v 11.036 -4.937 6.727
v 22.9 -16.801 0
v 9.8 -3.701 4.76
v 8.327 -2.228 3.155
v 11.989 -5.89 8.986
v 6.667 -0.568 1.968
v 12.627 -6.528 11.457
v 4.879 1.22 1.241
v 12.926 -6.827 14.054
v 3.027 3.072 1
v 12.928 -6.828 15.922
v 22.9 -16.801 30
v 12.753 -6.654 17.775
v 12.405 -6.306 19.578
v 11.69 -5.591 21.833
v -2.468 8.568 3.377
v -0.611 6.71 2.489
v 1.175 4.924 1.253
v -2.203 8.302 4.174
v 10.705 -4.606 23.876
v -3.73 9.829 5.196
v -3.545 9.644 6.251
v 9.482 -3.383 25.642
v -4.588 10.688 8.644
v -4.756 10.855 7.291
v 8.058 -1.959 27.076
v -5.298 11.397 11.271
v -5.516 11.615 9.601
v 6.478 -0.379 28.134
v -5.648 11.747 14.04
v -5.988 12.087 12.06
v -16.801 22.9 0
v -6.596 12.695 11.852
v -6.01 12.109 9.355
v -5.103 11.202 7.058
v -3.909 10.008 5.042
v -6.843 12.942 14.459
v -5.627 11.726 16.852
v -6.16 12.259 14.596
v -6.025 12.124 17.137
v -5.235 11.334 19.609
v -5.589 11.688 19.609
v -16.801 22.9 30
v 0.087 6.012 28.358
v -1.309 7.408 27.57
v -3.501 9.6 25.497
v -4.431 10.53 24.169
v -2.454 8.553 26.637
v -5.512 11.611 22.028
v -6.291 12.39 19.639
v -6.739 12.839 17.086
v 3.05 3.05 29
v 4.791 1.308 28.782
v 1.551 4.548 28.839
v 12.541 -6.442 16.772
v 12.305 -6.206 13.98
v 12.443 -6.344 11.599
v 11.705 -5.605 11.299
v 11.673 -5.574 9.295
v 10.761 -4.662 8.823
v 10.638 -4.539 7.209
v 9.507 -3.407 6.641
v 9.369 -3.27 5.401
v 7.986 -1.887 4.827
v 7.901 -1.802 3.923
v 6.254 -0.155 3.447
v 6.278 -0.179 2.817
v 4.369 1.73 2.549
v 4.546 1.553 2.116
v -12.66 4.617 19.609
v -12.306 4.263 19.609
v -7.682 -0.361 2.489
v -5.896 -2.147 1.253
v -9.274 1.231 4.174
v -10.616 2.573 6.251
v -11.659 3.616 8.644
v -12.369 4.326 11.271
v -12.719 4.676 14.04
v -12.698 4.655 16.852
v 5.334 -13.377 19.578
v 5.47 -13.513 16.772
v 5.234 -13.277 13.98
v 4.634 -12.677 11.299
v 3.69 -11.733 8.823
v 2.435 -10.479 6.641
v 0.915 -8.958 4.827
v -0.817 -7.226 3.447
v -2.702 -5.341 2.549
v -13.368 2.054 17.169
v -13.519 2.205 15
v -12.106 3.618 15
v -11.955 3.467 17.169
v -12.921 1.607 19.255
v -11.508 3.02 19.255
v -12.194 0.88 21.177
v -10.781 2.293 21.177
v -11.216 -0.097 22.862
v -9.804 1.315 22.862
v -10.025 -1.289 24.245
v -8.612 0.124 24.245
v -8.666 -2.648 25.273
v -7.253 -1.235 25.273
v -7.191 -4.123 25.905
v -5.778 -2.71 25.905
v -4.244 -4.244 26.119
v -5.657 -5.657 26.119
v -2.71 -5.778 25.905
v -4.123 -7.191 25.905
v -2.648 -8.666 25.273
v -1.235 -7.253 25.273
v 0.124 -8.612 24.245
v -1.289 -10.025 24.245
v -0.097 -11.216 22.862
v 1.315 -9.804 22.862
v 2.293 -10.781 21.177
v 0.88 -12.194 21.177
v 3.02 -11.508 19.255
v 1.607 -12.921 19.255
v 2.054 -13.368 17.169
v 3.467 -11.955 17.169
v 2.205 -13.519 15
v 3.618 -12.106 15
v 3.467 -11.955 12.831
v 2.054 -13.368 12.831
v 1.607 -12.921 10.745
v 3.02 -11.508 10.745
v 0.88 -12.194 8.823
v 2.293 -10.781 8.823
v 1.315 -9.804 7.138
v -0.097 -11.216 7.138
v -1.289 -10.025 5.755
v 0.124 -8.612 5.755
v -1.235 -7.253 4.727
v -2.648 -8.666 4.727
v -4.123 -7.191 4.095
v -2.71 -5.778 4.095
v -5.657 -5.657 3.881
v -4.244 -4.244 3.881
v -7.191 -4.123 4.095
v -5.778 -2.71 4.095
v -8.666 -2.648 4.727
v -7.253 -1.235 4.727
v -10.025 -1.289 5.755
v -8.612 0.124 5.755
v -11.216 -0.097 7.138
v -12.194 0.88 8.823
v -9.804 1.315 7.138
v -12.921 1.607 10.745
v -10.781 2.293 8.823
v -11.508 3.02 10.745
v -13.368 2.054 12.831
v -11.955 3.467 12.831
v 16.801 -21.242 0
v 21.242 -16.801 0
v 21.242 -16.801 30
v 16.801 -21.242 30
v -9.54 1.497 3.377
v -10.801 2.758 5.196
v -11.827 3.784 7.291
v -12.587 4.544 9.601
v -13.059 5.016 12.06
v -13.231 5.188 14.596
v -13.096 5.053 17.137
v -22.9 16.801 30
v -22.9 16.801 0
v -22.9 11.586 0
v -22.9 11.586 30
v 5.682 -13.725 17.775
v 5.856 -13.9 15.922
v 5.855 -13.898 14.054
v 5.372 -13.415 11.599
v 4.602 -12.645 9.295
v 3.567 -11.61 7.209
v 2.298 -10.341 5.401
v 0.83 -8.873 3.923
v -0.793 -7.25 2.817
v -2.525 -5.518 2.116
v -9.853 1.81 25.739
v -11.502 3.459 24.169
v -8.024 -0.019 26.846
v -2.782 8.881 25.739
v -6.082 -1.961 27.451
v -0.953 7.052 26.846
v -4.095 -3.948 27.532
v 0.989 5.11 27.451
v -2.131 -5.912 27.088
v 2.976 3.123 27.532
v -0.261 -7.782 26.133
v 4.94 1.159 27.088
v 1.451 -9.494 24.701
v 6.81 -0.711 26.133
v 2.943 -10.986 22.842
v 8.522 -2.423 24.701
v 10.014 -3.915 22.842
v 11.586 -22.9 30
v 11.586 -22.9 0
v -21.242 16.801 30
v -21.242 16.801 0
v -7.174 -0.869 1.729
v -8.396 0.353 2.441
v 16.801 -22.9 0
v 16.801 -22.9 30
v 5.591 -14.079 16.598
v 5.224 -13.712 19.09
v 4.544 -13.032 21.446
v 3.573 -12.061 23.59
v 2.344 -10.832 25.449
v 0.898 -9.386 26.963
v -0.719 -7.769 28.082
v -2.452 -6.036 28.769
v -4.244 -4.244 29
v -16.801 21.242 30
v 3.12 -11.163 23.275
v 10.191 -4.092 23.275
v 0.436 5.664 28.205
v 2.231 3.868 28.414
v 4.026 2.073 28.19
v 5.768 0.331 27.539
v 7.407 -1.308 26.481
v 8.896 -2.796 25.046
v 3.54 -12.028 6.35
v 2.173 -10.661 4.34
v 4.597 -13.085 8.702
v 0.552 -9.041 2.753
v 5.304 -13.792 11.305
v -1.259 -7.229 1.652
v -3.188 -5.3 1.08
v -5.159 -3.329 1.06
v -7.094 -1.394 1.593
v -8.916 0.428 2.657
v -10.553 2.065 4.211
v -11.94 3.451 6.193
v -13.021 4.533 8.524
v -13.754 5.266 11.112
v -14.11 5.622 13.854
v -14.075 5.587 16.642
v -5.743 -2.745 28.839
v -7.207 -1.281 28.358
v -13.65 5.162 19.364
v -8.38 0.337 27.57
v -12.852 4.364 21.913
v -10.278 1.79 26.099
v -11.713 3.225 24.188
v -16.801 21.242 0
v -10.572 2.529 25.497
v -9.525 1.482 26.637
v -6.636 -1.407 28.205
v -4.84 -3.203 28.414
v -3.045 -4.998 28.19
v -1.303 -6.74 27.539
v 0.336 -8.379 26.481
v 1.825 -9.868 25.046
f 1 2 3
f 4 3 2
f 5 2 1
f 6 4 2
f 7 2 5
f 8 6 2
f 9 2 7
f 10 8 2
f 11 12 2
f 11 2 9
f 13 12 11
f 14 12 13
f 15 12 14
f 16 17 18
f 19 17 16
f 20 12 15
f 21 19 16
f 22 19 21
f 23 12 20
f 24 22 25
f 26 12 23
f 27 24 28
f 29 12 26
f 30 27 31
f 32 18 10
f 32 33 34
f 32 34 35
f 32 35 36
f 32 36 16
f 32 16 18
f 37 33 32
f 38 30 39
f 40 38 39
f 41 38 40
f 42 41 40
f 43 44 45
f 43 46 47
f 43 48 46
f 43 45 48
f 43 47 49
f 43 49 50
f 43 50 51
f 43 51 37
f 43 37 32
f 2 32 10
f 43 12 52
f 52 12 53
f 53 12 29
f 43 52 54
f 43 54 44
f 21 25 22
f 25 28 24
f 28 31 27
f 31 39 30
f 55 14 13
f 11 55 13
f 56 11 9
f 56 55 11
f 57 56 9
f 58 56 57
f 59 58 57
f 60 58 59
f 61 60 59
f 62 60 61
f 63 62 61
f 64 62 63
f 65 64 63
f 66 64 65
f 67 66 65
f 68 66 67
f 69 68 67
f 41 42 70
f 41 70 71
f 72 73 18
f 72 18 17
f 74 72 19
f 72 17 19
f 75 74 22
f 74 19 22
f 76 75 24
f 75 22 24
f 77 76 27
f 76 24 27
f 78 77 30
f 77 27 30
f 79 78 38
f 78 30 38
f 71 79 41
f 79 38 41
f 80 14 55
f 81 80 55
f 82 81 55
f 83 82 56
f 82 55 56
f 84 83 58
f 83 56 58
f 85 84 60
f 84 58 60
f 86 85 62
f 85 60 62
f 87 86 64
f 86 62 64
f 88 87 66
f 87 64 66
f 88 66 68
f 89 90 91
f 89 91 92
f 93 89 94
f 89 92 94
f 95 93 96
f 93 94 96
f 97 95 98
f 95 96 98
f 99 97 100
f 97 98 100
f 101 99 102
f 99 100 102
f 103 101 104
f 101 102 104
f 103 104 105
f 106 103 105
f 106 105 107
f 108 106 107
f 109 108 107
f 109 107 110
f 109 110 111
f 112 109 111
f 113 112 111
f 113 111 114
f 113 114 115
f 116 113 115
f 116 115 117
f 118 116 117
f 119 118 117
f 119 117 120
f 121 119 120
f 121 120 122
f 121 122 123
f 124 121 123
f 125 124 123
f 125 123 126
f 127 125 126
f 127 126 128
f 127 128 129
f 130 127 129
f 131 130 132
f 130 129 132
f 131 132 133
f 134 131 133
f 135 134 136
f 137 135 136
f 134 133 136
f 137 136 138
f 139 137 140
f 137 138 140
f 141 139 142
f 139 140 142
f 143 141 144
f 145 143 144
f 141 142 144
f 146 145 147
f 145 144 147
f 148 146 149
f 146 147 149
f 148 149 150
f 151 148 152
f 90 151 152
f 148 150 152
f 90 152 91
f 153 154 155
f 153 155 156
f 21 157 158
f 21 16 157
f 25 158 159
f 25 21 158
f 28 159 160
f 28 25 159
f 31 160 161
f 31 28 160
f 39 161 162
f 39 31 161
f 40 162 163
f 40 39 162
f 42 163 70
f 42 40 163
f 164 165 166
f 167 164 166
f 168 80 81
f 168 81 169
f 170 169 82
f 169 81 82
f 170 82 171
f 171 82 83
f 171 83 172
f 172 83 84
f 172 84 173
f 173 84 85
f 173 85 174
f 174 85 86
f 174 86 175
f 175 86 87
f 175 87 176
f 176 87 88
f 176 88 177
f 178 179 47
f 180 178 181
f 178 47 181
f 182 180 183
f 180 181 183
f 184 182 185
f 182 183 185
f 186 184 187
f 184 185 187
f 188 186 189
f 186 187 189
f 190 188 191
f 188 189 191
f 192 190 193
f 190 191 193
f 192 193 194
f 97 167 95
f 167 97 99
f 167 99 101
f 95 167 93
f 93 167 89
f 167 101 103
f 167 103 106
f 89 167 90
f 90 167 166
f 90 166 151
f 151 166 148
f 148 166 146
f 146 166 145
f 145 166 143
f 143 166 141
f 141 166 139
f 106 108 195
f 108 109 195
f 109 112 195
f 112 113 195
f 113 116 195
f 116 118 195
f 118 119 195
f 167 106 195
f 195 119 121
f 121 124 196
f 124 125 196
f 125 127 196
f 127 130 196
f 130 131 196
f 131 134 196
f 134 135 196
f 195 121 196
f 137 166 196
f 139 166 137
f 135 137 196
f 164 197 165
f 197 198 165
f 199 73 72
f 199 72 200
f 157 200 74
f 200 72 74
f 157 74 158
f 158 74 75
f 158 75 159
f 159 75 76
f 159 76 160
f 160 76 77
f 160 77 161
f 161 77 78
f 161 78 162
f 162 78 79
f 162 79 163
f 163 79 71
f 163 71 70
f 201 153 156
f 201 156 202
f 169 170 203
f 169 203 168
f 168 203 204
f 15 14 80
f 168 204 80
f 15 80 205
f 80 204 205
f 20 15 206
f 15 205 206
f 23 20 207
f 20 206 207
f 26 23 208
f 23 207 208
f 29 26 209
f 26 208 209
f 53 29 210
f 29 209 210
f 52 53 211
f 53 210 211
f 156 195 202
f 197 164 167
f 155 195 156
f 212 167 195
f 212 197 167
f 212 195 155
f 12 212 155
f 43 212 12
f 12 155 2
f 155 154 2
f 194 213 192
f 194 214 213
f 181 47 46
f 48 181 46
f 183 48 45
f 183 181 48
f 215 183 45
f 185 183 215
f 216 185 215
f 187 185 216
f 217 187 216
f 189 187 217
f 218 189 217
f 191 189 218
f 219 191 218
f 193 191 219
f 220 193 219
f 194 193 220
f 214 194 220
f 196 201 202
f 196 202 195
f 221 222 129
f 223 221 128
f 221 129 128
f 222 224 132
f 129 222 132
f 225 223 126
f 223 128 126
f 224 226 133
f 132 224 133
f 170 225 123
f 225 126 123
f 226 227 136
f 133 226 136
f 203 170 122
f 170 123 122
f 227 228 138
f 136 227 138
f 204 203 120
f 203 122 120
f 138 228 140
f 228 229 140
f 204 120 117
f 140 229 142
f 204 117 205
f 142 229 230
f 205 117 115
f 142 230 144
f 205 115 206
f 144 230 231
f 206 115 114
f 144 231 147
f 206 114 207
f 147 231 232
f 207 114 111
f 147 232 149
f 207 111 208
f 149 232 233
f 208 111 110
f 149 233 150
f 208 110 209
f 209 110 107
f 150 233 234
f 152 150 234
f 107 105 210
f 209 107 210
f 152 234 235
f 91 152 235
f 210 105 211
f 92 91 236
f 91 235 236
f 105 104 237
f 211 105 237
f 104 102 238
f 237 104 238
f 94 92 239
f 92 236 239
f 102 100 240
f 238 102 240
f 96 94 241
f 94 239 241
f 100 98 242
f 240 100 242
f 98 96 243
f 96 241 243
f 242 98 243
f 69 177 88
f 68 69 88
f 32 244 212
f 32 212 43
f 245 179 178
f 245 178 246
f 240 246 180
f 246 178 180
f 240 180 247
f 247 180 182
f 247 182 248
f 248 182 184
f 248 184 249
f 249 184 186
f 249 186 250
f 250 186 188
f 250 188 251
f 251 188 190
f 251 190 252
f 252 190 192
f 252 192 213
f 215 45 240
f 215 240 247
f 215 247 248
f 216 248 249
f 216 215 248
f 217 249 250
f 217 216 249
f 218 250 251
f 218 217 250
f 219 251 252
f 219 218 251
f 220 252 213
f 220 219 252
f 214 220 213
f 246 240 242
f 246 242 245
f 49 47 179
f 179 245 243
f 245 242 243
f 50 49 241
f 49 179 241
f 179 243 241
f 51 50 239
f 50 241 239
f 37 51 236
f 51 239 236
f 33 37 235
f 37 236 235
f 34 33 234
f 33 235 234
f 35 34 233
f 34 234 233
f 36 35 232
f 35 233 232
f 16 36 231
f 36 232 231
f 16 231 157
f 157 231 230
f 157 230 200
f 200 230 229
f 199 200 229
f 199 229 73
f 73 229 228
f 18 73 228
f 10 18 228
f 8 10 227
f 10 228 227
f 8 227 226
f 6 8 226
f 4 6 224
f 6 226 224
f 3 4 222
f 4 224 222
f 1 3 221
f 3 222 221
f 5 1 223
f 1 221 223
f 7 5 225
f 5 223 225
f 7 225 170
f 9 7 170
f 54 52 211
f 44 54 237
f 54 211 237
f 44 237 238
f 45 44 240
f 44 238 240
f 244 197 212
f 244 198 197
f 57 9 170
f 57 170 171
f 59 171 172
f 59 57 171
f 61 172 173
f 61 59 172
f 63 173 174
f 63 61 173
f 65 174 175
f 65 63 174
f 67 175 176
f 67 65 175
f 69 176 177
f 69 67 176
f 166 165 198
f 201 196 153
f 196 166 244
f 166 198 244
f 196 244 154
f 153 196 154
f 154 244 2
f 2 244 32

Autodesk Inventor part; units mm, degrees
ref_plane "YZ Plane" through (0, 0, 0) normal (1, 0, 0) x (0, 1, 0)
ref_plane "XZ Plane" through (0, 0, 0) normal (0, 1, 0) x (-1, 0, 0)
ref_plane "XY Plane" through (0, 0, 0) normal (0, 0, 1) x (1, 0, 0)
sketch "Sketch1" plane through (0, 0, 0) normal (0, 0, 1) x (1, 0, 0)
  line L0 (-16.9, 21.4) -> (-16.9, 16.9) construction
  arc A0 (-22.9, 19.9) -> (-19.9, 22.9) centre (-19.9, 19.9) ccw construction
  line L1 (-16.9, 16.9) -> (16.9, 16.9) construction
  line L2 (16.9, 16.9) -> (16.9, -16.9) construction
  line L3 (16.9, -16.9) -> (-16.9, -16.9) construction
  line L4 (-16.9, -16.9) -> (-16.9, 16.9) construction
  arc A1 (22.9, -19.9) -> (19.9, -22.9) centre (19.9, -19.9) ccw construction
  line L5 (22.9, 19.9) -> (22.9, -19.9) construction
  arc A2 (19.9, 22.9) -> (22.9, 19.9) centre (19.9, 19.9) ccw construction
  line L6 (-19.9, 22.9) -> (19.9, 22.9) construction
  arc A3 (-22.9, 19.9) -> (-19.9, 22.9) centre (-19.9, 19.9) ccw construction
  line L7 (-22.9, -19.9) -> (-22.9, 19.9) construction
  arc A4 (-19.9, -22.9) -> (-22.9, -19.9) centre (-19.9, -19.9) ccw construction
  line L8 (19.9, -22.9) -> (-19.9, -22.9) construction
  line L9 (-21.4, 16.9) -> (-16.9, 16.9) construction
  line L10 (-16.9, -16.9) -> (-21.4, -16.9) construction
  line L11 (-16.9, -16.9) -> (-16.9, -21.4) construction
  line L12 (16.9, -21.4) -> (16.9, -16.9) construction
  line L13 (21.4, -16.9) -> (16.9, -16.9) construction
  line L14 (16.9, 16.9) -> (21.4, 16.9) construction
  line L15 (16.9, 16.9) -> (16.9, 21.4) construction
  line L16 (-16.8009, 21.2415) -> (21.2415, -16.8009)
  line L17 (21.2415, -16.8009) -> (16.8009, -21.2415)
  line L18 (16.8009, -21.2415) -> (-21.2415, 16.8009)
  line L19 (-21.2415, 16.8009) -> (-16.8009, 21.2415)
  line L20 (-16.8009, 21.2415) -> (16.8009, -21.2415) construction
  line L21 (21.2415, -16.8009) -> (-21.2415, 16.8009) construction
  line L22 (-16.8009, 21.2415) -> (36.9991, 21.2415) construction
  line L23 (-21.2415, 16.8009) -> (-22.9, 16.8009)
  line L24 (16.8009, -21.2415) -> (16.8009, -22.9)
  line L25 (16.8009, -22.9) -> (-22.9, 16.8009)
  line L26 (-16.8009, 21.2415) -> (-16.8009, 22.9)
  line L27 (21.2415, -16.8009) -> (22.9, -16.8009)
  line L28 (22.9, -16.8009) -> (-16.8009, 22.9)
  line L29 (-22.9, 16.8009) -> (-22.9, 11.5863)
  line L30 (16.8009, -22.9) -> (11.5863, -22.9)
  line L31 (-22.9, 11.5863) -> (11.5863, -22.9)
  point P0 (0, 0)
  dimension "d0" = 53.8
  dimension "d1" = 45
  dimension "d2" = 6.28
  dimension "d5" = 8
extrude "Extrusion1" add sketch "Sketch1" along normal blind 30
ref_plane "Work Plane1" through (16.9, -16.9, -8) normal (-0.7071, -0.7071, 0) x (0, 0, 1)
sketch "Sketch2" plane through (16.9, -16.9, -8) normal (-0.7071, -0.7071, 0) x (0, 0, 1)
  line L0 (8, -4.1725) -> (8, 51.973) projected
  line L1 (8, 51.973) -> (38, 51.973) projected
  line L2 (38, -4.1725) -> (38, 51.973) projected
  line L3 (8, -4.1725) -> (38, -4.1725) projected
  circle A0 centre (23, 23.9002) radius 14
  point P0 (8, 23.9002)
  dimension "d6" = 28
  dimension "d13" = 15
extrude "Extrusion2" cut sketch "Sketch2" along normal blind 6 and the other way blind 6 contours A0
sketch "Sketch3" plane through (-4.2426, -4.2426, 15) normal (0.7071, 0.7071, 0) x (-0.7071, 0.7071, 0)
  circle A0 centre (0, 0) radius 14 projected
  circle A1 centre (0, 0) radius 11.119
  point P0 (0, -15)
extrude "Extrusion3" cut sketch "Sketch3" against normal blind 6 contours A1
sketch "Sketch4" plane through (-16.8009, 22.9, 0) normal (0.7071, 0.7071, 0) x (-0.7071, 0.7071, 0)
  circle A0 centre (-28.0727, 15) radius 14 projected
  arc A1 (-20.2691, 3.3766) -> (-15.8567, 19.6091) centre (-30.0482, 14.7507) ccw
  arc A2 (-25.4219, 1.2532) -> (-16.3567, 19.6091) centre (-30.7204, 15.2863) ccw
  line L0 (-15.8567, 19.6091) -> (-16.3567, 19.6091)
  line L1 (-56.1455, 30) -> (0, 30) projected
  arc A3 (-25.4219, 1.2532) -> (-20.2691, 3.3766) centre (-28.0727, 15) ccw
  point P0 (-28.0727, 0)
  dimension "d14" = 0.5
  dimension "d15" = 15
  dimension "d16" = 15
extrude "Extrusion4" add sketch "Sketch4" against normal blind 10 contours A2 L0 A1 A0 picked at (-18.6617, 5.9923)
pattern_circular "Circular Pattern1" count 3 over 360 about axis through (0, 0, 15) along (-0.7071, -0.7071, 0) of "Extrusion4"
equation "\"d3\" = MirrorThickness1"
equation "\"d13\" = 0.5 * MirrorThickness1"
equation "\"MirrorThickness1\" = 30"
properties part number "20_Cube_Insert_Mirror_Holder_v2"
